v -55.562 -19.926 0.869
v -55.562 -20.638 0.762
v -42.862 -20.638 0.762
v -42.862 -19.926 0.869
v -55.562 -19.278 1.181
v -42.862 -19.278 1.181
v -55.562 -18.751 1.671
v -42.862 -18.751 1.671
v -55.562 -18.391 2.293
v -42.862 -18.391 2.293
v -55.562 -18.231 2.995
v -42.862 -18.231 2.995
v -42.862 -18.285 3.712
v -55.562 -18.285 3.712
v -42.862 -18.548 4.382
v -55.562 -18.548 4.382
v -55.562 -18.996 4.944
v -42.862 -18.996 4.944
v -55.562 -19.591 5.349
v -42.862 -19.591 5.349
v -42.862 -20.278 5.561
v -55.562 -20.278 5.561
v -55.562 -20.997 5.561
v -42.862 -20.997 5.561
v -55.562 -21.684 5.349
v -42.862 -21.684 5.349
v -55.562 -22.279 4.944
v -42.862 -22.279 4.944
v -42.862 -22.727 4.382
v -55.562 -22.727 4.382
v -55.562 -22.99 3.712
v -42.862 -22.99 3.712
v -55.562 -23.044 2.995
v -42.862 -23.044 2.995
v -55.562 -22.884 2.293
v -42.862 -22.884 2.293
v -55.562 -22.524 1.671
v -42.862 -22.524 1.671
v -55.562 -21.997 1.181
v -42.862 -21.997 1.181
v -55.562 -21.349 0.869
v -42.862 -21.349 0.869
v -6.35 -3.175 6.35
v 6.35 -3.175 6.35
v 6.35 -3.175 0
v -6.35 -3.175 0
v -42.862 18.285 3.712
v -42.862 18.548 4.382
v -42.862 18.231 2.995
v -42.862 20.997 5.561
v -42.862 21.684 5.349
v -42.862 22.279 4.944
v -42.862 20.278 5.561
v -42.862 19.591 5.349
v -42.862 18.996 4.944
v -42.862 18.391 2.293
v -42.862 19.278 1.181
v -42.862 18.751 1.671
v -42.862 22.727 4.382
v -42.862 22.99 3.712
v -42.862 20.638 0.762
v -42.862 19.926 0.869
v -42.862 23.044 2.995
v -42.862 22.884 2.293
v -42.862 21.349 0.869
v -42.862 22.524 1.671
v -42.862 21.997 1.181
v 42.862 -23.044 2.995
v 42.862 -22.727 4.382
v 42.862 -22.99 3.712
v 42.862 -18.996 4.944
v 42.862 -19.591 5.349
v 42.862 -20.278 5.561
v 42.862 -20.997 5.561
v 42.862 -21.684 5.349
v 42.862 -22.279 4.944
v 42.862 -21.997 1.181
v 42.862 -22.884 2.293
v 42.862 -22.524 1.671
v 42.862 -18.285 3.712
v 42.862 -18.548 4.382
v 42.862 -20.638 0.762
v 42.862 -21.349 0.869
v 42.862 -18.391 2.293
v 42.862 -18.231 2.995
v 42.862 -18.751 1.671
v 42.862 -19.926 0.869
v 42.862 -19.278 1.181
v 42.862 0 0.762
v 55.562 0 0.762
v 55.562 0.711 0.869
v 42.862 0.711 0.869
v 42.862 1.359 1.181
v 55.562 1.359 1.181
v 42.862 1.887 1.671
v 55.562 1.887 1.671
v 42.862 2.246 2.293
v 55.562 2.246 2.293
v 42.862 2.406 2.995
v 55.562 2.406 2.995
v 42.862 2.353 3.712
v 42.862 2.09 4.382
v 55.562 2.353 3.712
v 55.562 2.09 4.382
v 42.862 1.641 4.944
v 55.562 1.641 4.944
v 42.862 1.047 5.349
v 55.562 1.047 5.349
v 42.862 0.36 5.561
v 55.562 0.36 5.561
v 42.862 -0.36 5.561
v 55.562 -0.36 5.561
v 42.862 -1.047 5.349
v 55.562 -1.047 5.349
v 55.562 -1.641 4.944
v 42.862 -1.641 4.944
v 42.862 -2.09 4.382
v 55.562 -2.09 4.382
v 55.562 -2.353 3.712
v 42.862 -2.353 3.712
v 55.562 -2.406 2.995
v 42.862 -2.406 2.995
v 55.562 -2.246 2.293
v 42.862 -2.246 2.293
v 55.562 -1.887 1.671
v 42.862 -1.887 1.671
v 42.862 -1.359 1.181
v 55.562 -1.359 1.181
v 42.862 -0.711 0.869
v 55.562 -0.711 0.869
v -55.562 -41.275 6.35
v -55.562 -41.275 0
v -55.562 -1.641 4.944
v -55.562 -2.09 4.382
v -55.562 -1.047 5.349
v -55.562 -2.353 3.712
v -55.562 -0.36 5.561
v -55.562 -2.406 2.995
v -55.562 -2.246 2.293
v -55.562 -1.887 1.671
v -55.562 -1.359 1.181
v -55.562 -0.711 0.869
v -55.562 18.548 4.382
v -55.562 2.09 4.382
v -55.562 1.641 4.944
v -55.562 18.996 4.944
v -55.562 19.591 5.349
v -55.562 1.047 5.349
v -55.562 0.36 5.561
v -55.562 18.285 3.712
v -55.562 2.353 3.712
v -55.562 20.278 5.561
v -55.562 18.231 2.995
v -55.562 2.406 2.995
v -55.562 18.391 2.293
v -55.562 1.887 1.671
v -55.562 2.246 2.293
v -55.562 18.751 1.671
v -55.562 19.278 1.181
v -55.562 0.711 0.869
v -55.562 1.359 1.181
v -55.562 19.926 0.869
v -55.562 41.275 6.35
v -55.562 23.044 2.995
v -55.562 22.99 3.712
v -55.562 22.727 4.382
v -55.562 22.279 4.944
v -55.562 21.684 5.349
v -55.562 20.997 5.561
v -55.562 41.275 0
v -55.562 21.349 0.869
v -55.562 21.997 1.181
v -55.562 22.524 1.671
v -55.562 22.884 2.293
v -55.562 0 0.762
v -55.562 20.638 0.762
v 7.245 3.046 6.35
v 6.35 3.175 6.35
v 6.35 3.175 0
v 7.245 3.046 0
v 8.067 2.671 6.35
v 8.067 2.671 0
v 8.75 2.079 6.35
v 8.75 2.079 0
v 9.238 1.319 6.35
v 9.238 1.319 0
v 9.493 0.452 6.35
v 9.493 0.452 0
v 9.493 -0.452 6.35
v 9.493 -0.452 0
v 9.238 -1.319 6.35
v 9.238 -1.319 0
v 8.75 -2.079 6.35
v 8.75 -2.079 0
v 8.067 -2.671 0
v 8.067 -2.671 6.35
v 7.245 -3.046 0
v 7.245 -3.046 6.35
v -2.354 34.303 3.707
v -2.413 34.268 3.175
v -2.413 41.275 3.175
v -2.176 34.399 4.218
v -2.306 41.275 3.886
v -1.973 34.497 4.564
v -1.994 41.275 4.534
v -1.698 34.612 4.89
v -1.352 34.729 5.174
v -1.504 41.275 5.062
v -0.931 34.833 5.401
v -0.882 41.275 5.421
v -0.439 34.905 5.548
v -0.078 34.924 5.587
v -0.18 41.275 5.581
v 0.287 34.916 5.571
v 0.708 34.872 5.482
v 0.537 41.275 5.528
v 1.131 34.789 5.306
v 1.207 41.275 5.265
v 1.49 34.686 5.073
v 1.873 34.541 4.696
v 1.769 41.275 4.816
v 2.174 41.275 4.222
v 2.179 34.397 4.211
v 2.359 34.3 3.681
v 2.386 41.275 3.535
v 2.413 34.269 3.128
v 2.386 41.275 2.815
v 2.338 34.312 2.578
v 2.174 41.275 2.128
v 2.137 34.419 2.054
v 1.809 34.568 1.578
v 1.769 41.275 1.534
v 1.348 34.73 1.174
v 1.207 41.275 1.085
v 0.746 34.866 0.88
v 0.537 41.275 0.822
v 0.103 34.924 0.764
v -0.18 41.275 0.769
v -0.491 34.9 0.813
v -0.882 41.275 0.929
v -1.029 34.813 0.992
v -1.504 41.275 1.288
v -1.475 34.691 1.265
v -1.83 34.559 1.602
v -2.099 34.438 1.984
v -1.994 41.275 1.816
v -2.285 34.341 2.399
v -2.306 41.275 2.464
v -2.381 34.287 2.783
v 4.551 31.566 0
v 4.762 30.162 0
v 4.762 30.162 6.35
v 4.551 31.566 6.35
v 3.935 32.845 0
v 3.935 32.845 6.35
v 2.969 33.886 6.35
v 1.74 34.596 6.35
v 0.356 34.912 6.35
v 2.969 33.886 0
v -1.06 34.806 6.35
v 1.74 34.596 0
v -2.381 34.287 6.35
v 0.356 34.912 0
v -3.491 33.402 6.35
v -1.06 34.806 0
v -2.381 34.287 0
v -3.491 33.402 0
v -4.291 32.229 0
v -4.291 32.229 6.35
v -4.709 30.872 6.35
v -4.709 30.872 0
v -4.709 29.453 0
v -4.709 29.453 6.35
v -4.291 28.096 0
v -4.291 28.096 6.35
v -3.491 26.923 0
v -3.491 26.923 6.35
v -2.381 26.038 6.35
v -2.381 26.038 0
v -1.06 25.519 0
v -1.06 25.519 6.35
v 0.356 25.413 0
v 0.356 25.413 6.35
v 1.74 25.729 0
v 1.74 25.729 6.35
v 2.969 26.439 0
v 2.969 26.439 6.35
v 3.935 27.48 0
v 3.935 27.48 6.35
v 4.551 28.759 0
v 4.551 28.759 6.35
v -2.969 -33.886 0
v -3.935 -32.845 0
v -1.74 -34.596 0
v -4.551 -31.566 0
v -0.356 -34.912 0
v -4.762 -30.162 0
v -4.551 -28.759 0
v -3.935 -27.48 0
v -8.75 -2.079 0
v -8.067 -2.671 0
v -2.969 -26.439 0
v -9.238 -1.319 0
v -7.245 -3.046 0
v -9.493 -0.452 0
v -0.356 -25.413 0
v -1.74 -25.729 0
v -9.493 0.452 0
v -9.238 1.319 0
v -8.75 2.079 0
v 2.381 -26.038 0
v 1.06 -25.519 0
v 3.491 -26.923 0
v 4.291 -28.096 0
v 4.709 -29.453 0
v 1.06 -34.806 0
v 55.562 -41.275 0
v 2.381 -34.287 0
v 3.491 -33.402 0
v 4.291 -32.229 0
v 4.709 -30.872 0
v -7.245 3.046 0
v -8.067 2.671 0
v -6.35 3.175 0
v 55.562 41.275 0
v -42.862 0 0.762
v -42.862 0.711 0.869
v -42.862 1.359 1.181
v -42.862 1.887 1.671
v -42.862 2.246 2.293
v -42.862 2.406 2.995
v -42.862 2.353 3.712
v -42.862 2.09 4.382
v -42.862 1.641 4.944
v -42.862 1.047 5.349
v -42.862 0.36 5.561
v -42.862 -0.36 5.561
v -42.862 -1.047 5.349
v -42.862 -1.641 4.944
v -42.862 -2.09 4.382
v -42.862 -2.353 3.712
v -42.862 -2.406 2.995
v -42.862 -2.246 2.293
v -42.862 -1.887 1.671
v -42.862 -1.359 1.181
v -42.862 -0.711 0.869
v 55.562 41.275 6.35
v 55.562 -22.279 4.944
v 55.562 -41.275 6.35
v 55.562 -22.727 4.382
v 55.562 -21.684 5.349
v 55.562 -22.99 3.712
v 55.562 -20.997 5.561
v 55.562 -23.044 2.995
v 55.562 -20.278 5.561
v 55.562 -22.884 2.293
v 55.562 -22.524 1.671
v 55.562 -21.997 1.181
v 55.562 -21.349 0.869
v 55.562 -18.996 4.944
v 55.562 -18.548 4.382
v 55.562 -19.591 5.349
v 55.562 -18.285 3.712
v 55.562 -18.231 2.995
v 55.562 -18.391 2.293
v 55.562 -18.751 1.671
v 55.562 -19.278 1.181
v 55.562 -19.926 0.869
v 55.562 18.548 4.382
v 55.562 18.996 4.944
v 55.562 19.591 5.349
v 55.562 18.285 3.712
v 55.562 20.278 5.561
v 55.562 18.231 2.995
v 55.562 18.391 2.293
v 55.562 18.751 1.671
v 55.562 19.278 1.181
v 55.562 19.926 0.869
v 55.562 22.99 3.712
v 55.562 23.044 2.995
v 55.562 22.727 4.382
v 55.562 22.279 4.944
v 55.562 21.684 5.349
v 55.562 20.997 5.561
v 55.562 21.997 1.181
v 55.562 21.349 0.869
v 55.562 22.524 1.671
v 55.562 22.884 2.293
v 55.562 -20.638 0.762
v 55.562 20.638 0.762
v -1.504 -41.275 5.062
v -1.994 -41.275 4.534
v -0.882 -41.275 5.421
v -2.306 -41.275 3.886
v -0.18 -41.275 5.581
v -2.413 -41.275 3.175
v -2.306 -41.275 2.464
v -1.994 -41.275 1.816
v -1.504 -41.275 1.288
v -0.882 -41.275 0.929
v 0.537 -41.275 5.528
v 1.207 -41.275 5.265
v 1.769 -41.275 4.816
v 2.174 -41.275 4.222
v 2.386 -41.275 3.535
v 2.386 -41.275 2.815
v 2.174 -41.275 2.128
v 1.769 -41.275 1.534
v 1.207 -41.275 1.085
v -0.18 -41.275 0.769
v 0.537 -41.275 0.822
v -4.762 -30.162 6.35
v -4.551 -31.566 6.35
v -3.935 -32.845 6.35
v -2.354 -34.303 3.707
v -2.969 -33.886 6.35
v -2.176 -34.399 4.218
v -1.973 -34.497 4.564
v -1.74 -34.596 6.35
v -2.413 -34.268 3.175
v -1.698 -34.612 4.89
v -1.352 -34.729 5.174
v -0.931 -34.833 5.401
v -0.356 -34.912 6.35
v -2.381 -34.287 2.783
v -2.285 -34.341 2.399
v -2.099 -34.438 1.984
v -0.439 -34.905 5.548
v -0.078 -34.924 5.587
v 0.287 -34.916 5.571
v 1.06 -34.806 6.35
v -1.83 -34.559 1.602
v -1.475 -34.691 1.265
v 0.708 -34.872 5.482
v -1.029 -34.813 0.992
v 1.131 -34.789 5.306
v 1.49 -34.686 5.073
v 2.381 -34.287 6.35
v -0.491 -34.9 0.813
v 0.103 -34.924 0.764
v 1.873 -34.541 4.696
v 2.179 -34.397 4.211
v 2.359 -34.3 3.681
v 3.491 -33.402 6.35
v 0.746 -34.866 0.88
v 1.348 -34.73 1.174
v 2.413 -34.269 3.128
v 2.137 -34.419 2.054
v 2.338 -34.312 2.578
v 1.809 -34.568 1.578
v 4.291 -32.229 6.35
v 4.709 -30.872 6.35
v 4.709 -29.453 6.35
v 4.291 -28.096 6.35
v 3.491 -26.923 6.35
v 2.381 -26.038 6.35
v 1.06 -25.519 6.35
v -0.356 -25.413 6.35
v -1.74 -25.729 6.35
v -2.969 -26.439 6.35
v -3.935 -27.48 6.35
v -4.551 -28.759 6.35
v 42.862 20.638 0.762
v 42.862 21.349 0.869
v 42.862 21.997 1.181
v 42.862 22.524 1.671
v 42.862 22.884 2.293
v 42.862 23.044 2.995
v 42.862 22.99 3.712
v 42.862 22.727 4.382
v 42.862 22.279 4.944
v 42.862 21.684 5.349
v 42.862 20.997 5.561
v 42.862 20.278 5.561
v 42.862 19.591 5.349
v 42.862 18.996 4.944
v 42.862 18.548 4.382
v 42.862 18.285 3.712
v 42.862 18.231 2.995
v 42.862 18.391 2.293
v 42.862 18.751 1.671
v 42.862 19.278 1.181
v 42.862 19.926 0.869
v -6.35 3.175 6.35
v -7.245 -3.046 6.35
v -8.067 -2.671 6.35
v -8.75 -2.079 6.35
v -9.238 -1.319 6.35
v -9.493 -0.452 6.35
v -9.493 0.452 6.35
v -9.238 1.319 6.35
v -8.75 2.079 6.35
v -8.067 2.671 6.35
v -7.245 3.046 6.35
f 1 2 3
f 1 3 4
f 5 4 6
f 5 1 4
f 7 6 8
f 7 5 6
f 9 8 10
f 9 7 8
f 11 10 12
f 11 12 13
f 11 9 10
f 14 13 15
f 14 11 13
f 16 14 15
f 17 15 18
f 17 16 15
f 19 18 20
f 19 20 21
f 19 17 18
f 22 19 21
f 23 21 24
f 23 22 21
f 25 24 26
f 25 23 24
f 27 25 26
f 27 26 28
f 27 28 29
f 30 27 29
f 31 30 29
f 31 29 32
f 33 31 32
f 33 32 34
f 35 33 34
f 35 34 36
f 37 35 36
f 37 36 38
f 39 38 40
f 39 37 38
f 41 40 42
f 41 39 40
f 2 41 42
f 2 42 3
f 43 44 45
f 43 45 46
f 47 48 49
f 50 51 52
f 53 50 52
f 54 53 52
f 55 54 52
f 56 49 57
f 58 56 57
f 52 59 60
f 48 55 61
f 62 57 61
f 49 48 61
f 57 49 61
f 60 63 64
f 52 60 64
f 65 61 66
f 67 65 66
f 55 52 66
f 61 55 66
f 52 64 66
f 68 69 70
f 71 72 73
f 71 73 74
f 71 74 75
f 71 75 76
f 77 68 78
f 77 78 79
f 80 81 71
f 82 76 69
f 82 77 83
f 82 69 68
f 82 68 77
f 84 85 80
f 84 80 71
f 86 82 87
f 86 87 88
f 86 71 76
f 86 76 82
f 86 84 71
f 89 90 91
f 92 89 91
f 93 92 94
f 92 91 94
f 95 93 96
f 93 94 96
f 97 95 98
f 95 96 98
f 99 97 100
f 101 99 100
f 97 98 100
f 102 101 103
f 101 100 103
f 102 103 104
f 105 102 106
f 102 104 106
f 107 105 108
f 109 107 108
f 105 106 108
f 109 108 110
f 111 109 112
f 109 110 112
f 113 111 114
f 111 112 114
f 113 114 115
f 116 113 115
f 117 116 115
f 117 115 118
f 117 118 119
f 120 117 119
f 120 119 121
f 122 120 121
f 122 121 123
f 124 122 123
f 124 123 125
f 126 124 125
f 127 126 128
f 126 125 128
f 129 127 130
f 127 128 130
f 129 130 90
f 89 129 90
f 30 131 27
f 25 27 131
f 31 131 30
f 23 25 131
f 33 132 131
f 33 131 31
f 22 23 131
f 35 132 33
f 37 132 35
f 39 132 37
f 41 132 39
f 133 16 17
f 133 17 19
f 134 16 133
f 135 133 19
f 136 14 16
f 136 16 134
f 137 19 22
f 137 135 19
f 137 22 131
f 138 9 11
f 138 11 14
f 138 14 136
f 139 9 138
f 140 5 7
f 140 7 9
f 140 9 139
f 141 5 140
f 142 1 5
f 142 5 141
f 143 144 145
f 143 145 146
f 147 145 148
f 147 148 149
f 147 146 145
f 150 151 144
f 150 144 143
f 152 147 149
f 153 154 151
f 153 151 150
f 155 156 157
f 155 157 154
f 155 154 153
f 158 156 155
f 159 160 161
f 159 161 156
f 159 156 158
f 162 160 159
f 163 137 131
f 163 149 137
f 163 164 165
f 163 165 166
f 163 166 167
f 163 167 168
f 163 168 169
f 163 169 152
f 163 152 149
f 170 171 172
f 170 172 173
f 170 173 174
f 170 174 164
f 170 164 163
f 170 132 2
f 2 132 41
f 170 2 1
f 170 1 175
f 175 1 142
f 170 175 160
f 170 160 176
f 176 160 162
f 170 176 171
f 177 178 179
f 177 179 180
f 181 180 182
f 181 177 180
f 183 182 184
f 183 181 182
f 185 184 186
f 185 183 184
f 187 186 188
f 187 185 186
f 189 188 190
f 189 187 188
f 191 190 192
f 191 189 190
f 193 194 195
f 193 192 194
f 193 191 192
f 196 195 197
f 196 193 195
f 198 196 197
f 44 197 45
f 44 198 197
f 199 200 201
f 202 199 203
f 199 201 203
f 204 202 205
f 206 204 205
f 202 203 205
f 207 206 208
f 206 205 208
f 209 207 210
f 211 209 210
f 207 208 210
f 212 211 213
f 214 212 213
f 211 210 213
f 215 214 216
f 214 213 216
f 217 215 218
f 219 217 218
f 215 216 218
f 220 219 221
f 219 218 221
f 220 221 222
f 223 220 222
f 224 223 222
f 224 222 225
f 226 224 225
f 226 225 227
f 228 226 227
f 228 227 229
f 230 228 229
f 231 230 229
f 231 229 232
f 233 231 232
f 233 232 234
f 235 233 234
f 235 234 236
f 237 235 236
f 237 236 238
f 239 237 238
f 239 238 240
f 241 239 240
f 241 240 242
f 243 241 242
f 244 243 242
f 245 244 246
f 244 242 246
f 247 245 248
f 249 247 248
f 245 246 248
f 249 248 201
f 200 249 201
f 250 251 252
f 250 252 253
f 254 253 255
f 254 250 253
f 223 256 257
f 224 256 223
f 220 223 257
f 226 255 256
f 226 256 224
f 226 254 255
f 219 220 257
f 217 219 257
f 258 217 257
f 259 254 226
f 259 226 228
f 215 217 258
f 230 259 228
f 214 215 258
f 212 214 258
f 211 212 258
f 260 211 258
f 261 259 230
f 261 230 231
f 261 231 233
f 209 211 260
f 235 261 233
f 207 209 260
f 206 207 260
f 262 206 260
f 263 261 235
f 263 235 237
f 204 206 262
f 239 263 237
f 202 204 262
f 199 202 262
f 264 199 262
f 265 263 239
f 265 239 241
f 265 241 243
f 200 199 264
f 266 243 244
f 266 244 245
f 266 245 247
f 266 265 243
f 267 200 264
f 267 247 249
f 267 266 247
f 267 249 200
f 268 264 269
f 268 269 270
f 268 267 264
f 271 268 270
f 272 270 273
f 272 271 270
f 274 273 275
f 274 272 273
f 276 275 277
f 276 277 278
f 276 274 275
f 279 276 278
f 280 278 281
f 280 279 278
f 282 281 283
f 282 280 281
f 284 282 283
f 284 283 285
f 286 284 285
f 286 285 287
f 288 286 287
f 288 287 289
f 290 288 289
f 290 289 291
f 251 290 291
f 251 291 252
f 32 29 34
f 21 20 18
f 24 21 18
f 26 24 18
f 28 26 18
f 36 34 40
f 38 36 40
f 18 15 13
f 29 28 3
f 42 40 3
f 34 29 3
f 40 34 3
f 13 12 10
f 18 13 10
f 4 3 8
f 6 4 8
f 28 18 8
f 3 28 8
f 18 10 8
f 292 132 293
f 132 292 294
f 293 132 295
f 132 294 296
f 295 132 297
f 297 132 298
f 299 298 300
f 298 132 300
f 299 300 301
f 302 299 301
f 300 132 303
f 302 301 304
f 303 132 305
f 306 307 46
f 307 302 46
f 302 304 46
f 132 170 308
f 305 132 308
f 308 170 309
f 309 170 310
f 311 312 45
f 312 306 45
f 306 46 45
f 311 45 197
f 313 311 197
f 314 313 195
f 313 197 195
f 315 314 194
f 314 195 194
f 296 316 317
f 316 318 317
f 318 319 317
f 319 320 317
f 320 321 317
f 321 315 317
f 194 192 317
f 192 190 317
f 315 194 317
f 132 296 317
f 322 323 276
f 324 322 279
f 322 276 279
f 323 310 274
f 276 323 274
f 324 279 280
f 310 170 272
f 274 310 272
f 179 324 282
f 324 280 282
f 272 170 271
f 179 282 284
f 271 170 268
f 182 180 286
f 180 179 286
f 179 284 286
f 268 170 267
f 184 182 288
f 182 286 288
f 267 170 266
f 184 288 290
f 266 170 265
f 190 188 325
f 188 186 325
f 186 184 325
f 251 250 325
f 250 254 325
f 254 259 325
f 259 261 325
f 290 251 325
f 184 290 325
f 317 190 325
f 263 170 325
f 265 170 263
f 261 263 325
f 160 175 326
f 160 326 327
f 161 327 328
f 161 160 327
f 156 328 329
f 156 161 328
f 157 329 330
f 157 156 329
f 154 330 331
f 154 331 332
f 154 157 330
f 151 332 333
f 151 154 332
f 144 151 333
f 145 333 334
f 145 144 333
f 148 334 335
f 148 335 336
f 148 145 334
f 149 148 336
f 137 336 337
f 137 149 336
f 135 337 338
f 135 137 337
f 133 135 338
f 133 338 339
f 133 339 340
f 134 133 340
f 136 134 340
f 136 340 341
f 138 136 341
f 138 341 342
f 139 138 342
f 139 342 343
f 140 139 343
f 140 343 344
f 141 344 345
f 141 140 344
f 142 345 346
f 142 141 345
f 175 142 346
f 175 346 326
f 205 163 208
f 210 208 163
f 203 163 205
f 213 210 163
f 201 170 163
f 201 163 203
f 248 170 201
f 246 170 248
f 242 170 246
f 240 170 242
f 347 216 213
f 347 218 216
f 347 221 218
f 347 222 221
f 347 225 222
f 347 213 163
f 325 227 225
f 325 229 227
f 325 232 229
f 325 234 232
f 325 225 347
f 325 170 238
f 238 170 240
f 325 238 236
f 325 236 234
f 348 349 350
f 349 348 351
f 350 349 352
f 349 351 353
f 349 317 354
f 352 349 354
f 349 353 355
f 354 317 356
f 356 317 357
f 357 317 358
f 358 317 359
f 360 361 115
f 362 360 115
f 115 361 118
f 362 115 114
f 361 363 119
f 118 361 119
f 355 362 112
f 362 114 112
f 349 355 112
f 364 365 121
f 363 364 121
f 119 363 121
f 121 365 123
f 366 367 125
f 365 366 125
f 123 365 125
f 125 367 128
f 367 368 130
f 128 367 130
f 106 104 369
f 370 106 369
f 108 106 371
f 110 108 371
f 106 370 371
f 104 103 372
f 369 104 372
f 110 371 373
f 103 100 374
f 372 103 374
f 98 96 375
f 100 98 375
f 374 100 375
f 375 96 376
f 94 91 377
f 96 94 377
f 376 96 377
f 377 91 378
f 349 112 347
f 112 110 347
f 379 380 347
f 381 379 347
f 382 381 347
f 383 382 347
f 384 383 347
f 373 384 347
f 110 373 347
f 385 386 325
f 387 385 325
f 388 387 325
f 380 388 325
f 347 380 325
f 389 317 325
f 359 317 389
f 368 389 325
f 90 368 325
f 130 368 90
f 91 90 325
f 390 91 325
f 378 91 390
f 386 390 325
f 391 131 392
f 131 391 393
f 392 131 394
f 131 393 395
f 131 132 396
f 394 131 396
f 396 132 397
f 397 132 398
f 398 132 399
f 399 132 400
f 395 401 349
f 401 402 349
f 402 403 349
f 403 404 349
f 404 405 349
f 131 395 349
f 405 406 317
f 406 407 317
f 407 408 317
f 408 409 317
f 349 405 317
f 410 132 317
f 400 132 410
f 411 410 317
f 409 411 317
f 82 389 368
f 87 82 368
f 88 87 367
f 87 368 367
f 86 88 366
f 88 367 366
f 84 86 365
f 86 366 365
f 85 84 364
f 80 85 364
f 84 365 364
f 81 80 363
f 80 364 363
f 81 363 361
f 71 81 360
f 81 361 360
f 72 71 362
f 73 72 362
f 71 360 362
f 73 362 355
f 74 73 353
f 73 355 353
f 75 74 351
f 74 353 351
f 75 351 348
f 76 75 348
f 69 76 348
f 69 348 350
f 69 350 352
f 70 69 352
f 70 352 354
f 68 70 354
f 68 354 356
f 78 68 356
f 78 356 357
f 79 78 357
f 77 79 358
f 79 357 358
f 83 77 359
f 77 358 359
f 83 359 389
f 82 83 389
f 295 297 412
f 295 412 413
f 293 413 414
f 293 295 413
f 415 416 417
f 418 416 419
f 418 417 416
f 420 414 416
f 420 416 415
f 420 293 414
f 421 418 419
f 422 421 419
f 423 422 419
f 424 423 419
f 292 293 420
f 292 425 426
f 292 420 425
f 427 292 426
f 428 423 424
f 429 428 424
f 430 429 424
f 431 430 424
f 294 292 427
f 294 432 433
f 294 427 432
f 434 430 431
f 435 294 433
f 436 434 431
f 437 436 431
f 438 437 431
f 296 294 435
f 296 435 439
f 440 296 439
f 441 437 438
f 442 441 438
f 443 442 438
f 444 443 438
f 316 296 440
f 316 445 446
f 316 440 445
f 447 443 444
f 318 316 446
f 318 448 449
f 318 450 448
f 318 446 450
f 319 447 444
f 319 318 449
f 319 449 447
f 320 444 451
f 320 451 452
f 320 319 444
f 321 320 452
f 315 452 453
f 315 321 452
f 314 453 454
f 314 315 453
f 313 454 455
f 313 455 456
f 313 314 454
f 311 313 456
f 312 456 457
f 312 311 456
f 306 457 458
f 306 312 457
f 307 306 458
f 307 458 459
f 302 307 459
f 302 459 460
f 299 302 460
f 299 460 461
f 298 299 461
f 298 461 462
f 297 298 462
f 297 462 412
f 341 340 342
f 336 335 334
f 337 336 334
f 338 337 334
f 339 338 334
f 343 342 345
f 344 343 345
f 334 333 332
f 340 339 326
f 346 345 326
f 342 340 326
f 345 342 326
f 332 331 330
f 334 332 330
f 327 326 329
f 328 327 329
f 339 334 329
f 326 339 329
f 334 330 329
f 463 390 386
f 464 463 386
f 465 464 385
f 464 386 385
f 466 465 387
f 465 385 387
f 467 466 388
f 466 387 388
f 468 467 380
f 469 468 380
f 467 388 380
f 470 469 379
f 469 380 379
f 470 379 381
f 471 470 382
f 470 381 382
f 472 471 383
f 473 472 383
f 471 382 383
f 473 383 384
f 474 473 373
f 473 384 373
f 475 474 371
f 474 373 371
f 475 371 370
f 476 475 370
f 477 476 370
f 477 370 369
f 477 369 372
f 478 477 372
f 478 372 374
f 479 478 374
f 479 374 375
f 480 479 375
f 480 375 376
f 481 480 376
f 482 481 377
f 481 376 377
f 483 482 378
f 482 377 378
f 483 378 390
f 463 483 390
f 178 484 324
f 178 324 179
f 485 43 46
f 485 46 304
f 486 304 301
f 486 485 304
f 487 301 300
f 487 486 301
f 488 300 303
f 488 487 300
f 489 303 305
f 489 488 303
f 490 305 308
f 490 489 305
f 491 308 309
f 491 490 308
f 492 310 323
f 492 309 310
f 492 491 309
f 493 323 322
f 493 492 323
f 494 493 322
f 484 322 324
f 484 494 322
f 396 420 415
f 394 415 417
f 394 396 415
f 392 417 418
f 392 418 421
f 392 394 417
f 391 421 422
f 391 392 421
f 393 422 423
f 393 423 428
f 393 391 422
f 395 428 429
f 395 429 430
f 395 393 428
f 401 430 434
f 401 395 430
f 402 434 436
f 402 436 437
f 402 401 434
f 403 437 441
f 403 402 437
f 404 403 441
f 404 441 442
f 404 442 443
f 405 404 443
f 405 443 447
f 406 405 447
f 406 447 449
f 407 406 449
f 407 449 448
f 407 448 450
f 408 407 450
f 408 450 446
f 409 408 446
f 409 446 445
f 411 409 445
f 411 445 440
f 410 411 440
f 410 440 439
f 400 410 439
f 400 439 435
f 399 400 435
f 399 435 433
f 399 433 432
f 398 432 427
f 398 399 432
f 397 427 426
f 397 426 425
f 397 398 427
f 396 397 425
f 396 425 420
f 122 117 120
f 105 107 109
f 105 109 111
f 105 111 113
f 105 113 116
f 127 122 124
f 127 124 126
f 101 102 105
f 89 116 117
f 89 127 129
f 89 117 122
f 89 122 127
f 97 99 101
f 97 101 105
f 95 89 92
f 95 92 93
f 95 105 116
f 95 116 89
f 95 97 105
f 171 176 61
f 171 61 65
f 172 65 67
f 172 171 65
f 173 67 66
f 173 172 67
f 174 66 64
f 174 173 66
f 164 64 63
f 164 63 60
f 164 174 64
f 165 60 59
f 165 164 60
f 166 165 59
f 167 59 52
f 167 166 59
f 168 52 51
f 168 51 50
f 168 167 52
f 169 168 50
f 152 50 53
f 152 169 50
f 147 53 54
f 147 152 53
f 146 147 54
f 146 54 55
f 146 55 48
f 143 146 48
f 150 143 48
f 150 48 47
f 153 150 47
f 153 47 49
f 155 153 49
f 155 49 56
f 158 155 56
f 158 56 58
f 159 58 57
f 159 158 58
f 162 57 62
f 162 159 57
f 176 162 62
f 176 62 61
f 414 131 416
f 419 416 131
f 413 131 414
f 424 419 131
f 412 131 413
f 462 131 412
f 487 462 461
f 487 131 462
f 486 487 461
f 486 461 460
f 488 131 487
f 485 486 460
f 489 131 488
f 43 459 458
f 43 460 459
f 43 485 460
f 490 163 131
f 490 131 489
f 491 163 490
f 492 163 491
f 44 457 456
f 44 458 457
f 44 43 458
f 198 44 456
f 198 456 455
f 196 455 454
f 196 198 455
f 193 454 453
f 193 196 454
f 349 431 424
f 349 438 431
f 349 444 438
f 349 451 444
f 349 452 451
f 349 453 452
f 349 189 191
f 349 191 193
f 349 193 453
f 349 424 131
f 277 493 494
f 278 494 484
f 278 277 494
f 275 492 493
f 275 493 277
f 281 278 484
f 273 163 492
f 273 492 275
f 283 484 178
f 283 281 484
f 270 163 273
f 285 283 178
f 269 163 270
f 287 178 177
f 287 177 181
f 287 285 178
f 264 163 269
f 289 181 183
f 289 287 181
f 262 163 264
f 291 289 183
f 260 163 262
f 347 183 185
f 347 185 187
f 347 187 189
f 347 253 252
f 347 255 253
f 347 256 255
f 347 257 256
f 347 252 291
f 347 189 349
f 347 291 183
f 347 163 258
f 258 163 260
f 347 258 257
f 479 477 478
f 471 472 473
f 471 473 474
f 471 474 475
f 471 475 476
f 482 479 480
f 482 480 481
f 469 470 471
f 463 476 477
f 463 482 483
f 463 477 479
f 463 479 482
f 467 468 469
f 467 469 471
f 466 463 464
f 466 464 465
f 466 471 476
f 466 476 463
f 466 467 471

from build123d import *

# Parameters (mm, degrees)
SKETCH1_W           = 111.125
SKETCH1_H           = 82.55
SKETCH1_R           = 4.7625
BOSS_EXTRUDE1_DEPTH = 6.35
SKETCH2_R           = 2.413
CUT_EXTRUDE1_DEPTH  = 12.7
SKETCH3_R           = 2.413
CUT_EXTRUDE2_DEPTH  = 12.7
CUT_EXTRUDE3_DEPTH  = 7.62


with BuildPart() as part:
    # Sketch1 → Boss-Extrude1 (new body)
    with BuildSketch(Plane.XY):
        Rectangle(SKETCH1_W, SKETCH1_H)
        with Locations((0, 30.1625)):
            Circle(SKETCH1_R, mode=Mode.SUBTRACT)
        with Locations(Location((0, -30.1625, 0), (0, 0, 180))):
            Circle(SKETCH1_R, mode=Mode.SUBTRACT)
    extrude(amount=BOSS_EXTRUDE1_DEPTH)

    # Sketch2 → Cut-Extrude1 (cut)
    with BuildSketch(Plane(origin=(55.5625, 0, 0), x_dir=(0, 0, -1), z_dir=(1, 0, 0))):
        with Locations((-3.175, 20.6375)):
            Circle(SKETCH2_R)
        with Locations((-3.175, 0)):
            Circle(SKETCH2_R)
        with Locations((-3.175, -20.6375)):
            Circle(SKETCH2_R)
    cut_extrude1 = extrude(amount=-CUT_EXTRUDE1_DEPTH, mode=Mode.SUBTRACT)

    # Mirror1: Cut-Extrude1 across plane
    add(cut_extrude1.mirror(Plane(origin=(0, 0, 0), x_dir=(0, 0, 1), z_dir=(1, 0, 0))), mode=Mode.SUBTRACT)

    # Sketch3 → Cut-Extrude2 (cut)
    with BuildSketch(Plane(origin=(0, 41.275, 0), x_dir=(1, 0, 0), z_dir=(0, 1, 0))):
        with Locations(Location((0, -3.175, 0), (0, 0, 180))):
            Circle(SKETCH3_R)
    cut_extrude2 = extrude(amount=-CUT_EXTRUDE2_DEPTH, mode=Mode.SUBTRACT)

    # Mirror2: Cut-Extrude2 across plane
    add(cut_extrude2.mirror(Plane.ZX), mode=Mode.SUBTRACT)

    # Sketch4 → Cut-Extrude3 (cut)
    with BuildSketch(Plane.XY.offset(6.35)):
        with BuildLine():
            Line((-6.35, 3.175), (6.35, 3.175))
            ThreePointArc((6.35, 3.175), (9.525, 0), (6.35, -3.175))
            Line((6.35, -3.175), (-6.35, -3.175))
            ThreePointArc((-6.35, -3.175), (-9.525, 0), (-6.35, 3.175))
        make_face()
    extrude(amount=-CUT_EXTRUDE3_DEPTH, mode=Mode.SUBTRACT)


solid = part.part
